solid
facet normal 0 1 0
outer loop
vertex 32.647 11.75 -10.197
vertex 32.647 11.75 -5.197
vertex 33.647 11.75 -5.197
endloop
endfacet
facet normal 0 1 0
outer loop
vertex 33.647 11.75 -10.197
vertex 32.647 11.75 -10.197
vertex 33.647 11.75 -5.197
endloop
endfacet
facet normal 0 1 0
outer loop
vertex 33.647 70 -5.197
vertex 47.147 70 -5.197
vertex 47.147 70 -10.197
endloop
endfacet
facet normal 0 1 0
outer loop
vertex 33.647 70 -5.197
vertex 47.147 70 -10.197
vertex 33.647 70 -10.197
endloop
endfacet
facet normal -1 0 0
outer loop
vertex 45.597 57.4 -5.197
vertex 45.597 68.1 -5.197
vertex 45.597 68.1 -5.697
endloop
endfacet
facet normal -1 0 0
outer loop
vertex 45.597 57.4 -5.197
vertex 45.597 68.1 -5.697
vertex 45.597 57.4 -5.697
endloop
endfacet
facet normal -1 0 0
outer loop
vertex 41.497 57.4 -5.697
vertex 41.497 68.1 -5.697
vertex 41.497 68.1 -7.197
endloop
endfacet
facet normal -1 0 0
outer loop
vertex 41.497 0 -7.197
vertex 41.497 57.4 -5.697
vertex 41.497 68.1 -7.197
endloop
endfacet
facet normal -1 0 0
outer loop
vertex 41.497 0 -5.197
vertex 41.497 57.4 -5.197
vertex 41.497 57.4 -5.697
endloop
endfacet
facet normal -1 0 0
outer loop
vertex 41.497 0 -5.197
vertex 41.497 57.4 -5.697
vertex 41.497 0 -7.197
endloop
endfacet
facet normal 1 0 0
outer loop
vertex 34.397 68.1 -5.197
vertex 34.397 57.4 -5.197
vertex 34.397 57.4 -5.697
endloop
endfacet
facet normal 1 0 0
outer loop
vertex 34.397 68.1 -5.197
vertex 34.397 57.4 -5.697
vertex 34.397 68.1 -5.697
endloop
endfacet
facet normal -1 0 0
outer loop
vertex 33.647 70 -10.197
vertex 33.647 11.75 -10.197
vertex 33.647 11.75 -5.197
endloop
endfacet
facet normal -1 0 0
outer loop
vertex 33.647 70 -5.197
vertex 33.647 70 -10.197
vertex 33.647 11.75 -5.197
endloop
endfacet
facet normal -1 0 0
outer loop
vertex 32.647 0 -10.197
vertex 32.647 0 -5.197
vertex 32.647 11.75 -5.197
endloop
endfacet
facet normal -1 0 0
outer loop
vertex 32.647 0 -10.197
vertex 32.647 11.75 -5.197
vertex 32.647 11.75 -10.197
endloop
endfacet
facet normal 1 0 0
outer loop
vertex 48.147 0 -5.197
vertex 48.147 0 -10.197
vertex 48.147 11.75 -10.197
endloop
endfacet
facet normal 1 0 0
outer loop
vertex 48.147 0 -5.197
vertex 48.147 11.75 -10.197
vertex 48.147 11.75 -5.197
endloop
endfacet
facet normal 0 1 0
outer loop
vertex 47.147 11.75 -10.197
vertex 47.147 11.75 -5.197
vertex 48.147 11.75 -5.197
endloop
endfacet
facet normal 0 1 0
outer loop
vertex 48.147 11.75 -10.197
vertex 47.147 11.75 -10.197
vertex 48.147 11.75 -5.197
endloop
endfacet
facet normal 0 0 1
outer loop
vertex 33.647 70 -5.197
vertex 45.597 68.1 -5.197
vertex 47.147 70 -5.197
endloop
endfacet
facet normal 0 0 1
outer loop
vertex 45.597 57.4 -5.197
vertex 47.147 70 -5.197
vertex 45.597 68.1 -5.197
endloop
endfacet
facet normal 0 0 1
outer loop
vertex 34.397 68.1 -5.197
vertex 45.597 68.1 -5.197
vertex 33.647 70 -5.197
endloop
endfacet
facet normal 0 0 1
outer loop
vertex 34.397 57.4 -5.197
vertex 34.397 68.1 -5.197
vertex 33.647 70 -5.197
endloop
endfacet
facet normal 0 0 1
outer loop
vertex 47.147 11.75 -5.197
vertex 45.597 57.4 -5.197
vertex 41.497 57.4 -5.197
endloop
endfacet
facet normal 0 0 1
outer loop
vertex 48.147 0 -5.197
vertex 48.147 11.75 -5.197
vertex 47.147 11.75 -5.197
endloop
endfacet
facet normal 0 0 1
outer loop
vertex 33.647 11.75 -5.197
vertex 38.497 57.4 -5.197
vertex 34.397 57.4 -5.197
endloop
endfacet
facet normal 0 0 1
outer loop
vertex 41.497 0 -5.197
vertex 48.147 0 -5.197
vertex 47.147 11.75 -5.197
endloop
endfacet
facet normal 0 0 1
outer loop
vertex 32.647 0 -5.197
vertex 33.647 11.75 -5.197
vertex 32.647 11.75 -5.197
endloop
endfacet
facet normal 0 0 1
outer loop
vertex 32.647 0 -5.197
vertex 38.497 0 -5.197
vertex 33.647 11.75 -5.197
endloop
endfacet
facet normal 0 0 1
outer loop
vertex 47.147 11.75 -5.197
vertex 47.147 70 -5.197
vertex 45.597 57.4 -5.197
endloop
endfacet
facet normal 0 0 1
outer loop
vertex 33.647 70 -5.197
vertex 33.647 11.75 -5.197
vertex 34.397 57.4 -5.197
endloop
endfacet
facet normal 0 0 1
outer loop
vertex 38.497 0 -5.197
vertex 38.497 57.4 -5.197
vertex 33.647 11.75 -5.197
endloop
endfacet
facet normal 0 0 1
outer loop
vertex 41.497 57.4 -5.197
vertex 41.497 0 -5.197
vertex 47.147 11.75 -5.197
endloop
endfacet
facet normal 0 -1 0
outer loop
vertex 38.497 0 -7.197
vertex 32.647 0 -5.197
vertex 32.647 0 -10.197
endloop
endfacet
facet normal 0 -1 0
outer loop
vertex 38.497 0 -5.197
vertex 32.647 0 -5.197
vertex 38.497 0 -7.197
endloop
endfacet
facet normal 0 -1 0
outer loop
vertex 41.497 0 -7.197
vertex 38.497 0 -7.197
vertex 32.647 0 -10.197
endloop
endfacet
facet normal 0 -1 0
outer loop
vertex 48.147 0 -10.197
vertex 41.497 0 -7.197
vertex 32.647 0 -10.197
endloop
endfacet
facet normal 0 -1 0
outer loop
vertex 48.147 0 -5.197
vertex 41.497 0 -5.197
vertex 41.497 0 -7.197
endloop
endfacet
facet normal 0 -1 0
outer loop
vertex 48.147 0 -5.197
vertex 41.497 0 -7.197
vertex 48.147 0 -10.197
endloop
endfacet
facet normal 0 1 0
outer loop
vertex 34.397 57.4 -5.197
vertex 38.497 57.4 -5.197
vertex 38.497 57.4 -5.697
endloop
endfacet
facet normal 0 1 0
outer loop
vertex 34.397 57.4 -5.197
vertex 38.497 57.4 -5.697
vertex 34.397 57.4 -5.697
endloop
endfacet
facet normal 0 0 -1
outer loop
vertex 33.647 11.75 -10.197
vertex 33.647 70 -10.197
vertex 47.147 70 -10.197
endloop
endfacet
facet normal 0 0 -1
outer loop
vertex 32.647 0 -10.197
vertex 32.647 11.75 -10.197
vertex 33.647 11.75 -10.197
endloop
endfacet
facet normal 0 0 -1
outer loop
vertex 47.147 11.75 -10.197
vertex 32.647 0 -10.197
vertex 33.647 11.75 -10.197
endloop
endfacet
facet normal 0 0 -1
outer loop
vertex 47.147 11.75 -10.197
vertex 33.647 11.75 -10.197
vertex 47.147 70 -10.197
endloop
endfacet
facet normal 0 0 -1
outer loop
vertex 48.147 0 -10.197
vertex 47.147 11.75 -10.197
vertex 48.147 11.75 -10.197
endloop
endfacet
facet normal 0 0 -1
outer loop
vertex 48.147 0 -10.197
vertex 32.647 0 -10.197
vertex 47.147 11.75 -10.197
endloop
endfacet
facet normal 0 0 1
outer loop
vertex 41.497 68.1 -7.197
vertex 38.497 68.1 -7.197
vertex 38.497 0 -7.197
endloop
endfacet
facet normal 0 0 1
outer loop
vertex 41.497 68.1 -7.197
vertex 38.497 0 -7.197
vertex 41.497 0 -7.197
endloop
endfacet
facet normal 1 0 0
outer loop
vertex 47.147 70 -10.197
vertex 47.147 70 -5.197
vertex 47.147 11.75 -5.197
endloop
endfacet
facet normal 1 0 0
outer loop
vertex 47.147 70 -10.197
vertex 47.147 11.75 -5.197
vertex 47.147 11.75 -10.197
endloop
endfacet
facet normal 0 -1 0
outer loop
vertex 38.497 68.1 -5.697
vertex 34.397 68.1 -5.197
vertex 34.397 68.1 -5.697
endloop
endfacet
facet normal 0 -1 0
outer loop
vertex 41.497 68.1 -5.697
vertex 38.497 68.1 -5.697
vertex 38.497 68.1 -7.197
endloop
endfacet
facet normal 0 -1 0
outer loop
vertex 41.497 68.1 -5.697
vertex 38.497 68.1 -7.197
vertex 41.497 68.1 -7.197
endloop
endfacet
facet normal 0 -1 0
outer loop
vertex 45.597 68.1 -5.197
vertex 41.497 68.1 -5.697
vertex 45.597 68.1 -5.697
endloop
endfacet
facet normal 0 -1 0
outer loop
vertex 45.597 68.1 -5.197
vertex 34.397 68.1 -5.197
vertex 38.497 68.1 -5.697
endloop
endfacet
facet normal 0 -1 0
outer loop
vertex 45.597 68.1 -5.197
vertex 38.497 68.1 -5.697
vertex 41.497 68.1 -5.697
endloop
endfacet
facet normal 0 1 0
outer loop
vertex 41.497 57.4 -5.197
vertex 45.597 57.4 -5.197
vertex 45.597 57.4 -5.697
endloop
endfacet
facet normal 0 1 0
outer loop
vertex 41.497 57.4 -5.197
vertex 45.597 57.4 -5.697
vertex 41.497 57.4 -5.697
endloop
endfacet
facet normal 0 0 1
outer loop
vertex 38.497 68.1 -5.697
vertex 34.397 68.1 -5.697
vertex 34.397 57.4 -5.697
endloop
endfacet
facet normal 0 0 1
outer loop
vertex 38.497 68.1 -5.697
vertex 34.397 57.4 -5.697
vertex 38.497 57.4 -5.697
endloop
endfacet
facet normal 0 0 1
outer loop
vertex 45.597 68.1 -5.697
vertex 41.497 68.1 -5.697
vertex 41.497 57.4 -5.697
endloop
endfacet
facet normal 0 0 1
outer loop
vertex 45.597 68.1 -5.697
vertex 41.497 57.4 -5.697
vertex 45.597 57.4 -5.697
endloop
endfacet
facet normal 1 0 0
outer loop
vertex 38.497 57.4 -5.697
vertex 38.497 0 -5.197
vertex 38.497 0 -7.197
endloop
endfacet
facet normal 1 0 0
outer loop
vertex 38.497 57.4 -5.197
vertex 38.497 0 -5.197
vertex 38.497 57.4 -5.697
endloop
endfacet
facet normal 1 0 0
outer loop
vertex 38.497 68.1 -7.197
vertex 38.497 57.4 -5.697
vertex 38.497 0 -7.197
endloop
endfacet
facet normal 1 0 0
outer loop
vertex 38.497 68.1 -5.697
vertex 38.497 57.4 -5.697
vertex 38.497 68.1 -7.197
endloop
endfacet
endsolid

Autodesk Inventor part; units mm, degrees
ref_plane "YZ Plane" through (0, 0, 0) normal (1, 0, 0) x (0, 1, 0)
ref_plane "XZ Plane" through (0, 0, 0) normal (0, 1, 0) x (-1, 0, 0)
ref_plane "XY Plane" through (0, 0, 0) normal (0, 0, 1) x (1, 0, 0)
sketch "Skizze4" plane through (0, 0, 0) normal (0, 1, 0) x (-1, 0, 0)
  line L0 (-33.6472, -5.1972) -> (-47.1472, -5.1972)
  line L1 (-47.1472, -5.1972) -> (-47.1472, -7.0972)
  line L2 (-47.1472, -7.0972) -> (-47.1472, -7.0972)
  line L3 (-47.1472, -7.0972) -> (-47.1472, -8.2972)
  line L4 (-47.1472, -8.2972) -> (-47.1472, -8.2972)
  line L5 (-47.1472, -8.2972) -> (-47.1472, -10.1972)
  line L6 (-47.1472, -10.1972) -> (-33.6472, -10.1972)
  line L7 (-33.6472, -10.1972) -> (-33.6472, -8.2972)
  line L8 (-33.6472, -8.2972) -> (-33.6472, -8.2972)
  line L9 (-33.6472, -8.2972) -> (-33.6472, -7.0972)
  line L10 (-33.6472, -7.0972) -> (-33.6472, -7.0972)
  line L11 (-33.6472, -7.0972) -> (-33.6472, -5.1972)
  dimension "Kerbentiefe" = 0
  dimension "b_Halter" = 13.5
  dimension "d12" = 0
  dimension "Kerbenbreite" = 1.2
  dimension "d_Halter" = 5
extrude "Extrusion3" add sketch "Skizze4" along normal blind 70
sketch "Skizze6" plane through (33.6472, 0, -5.1972) normal (0, 0, 1) x (1, 0, 0)
  line L0 (0, 70) -> (13.5, 70) projected
  line L1 (0.75, 68.1) -> (11.95, 68.1)
  line L2 (11.95, 68.1) -> (11.95, 57.4)
  line L3 (11.95, 57.4) -> (0.75, 57.4)
  line L4 (0.75, 57.4) -> (0.75, 68.1)
  line L5 (0, 0) -> (13.5, 0) projected
  line L6 (6.75, 70) -> (6.75, 0) construction
  dimension "d20" = 1.9
  dimension "d21" = 10.7
  dimension "d22" = 11.2
  dimension "d31" = 5.2
extrude "Extrusion5" cut sketch "Skizze6" against normal blind 0.5
sketch "Skizze7" plane through (33.6472, 0, -5.1972) normal (0, 0, 1) x (1, 0, 0)
  line L0 (0.75, 68.1) -> (11.95, 68.1) projected
  line L1 (0, 0) -> (13.5, 0) projected
  line L2 (0.75, 68.1) -> (11.95, 68.1) projected
  line L3 (4.85, 68.1) -> (7.85, 68.1)
  line L4 (7.85, 68.1) -> (7.85, 0)
  line L5 (7.85, 0) -> (4.85, 0)
  line L6 (4.85, 0) -> (4.85, 68.1)
  line L7 (0.75, 57.4) -> (0.75, 68.1) projected
  dimension "d26" = 3
  dimension "d32" = 4.1
extrude "Extrusion6" cut sketch "Skizze7" against normal blind 2
ref_plane "hor_Strahlebene" through (34.3972, 62.75, -5.1972) normal (0, 1, 0) x (1, 0, 0)
ref_plane "Ebene_Anschlag2" through (34.3972, 11.75, -5.1972) normal (0, 1, 0) x (1, 0, 0)
sketch "Skizze10" plane through (0, 0, 0) normal (0, -1, 0) x (1, 0, 0)
  line L0 (33.6472, -5.1972) -> (32.6472, -5.1972)
  line L1 (32.6472, -5.1972) -> (32.6472, -10.1972)
  line L2 (32.6472, -10.1972) -> (33.6472, -10.1972)
  line L3 (33.6472, -10.1972) -> (33.6472, -5.1972)
  dimension "d36" = 1
extrude "Extrusion8" add sketch "Skizze10" against normal up to surface (11.75 mm away)
ref_plane "Mittelebene_Halter" through (40.3972, 70, -10.1972) normal (-1, 0, 0) x (0, 0, 1)
mirror "Spiegeln1" about plane through (40.3972, 70, -10.1972) normal (-1, 0, 0) of "Extrusion8"
ref_plane "Arbeitsebene4" through (40.3972, 70, -10.1972) normal (-1, 0, 0) x (0, 0, 1)
equation "\"d32\" = -0.5 * d26 + 0.5 * d22"
properties part number "Halter_PP" material "ABS-Kunststoff"
